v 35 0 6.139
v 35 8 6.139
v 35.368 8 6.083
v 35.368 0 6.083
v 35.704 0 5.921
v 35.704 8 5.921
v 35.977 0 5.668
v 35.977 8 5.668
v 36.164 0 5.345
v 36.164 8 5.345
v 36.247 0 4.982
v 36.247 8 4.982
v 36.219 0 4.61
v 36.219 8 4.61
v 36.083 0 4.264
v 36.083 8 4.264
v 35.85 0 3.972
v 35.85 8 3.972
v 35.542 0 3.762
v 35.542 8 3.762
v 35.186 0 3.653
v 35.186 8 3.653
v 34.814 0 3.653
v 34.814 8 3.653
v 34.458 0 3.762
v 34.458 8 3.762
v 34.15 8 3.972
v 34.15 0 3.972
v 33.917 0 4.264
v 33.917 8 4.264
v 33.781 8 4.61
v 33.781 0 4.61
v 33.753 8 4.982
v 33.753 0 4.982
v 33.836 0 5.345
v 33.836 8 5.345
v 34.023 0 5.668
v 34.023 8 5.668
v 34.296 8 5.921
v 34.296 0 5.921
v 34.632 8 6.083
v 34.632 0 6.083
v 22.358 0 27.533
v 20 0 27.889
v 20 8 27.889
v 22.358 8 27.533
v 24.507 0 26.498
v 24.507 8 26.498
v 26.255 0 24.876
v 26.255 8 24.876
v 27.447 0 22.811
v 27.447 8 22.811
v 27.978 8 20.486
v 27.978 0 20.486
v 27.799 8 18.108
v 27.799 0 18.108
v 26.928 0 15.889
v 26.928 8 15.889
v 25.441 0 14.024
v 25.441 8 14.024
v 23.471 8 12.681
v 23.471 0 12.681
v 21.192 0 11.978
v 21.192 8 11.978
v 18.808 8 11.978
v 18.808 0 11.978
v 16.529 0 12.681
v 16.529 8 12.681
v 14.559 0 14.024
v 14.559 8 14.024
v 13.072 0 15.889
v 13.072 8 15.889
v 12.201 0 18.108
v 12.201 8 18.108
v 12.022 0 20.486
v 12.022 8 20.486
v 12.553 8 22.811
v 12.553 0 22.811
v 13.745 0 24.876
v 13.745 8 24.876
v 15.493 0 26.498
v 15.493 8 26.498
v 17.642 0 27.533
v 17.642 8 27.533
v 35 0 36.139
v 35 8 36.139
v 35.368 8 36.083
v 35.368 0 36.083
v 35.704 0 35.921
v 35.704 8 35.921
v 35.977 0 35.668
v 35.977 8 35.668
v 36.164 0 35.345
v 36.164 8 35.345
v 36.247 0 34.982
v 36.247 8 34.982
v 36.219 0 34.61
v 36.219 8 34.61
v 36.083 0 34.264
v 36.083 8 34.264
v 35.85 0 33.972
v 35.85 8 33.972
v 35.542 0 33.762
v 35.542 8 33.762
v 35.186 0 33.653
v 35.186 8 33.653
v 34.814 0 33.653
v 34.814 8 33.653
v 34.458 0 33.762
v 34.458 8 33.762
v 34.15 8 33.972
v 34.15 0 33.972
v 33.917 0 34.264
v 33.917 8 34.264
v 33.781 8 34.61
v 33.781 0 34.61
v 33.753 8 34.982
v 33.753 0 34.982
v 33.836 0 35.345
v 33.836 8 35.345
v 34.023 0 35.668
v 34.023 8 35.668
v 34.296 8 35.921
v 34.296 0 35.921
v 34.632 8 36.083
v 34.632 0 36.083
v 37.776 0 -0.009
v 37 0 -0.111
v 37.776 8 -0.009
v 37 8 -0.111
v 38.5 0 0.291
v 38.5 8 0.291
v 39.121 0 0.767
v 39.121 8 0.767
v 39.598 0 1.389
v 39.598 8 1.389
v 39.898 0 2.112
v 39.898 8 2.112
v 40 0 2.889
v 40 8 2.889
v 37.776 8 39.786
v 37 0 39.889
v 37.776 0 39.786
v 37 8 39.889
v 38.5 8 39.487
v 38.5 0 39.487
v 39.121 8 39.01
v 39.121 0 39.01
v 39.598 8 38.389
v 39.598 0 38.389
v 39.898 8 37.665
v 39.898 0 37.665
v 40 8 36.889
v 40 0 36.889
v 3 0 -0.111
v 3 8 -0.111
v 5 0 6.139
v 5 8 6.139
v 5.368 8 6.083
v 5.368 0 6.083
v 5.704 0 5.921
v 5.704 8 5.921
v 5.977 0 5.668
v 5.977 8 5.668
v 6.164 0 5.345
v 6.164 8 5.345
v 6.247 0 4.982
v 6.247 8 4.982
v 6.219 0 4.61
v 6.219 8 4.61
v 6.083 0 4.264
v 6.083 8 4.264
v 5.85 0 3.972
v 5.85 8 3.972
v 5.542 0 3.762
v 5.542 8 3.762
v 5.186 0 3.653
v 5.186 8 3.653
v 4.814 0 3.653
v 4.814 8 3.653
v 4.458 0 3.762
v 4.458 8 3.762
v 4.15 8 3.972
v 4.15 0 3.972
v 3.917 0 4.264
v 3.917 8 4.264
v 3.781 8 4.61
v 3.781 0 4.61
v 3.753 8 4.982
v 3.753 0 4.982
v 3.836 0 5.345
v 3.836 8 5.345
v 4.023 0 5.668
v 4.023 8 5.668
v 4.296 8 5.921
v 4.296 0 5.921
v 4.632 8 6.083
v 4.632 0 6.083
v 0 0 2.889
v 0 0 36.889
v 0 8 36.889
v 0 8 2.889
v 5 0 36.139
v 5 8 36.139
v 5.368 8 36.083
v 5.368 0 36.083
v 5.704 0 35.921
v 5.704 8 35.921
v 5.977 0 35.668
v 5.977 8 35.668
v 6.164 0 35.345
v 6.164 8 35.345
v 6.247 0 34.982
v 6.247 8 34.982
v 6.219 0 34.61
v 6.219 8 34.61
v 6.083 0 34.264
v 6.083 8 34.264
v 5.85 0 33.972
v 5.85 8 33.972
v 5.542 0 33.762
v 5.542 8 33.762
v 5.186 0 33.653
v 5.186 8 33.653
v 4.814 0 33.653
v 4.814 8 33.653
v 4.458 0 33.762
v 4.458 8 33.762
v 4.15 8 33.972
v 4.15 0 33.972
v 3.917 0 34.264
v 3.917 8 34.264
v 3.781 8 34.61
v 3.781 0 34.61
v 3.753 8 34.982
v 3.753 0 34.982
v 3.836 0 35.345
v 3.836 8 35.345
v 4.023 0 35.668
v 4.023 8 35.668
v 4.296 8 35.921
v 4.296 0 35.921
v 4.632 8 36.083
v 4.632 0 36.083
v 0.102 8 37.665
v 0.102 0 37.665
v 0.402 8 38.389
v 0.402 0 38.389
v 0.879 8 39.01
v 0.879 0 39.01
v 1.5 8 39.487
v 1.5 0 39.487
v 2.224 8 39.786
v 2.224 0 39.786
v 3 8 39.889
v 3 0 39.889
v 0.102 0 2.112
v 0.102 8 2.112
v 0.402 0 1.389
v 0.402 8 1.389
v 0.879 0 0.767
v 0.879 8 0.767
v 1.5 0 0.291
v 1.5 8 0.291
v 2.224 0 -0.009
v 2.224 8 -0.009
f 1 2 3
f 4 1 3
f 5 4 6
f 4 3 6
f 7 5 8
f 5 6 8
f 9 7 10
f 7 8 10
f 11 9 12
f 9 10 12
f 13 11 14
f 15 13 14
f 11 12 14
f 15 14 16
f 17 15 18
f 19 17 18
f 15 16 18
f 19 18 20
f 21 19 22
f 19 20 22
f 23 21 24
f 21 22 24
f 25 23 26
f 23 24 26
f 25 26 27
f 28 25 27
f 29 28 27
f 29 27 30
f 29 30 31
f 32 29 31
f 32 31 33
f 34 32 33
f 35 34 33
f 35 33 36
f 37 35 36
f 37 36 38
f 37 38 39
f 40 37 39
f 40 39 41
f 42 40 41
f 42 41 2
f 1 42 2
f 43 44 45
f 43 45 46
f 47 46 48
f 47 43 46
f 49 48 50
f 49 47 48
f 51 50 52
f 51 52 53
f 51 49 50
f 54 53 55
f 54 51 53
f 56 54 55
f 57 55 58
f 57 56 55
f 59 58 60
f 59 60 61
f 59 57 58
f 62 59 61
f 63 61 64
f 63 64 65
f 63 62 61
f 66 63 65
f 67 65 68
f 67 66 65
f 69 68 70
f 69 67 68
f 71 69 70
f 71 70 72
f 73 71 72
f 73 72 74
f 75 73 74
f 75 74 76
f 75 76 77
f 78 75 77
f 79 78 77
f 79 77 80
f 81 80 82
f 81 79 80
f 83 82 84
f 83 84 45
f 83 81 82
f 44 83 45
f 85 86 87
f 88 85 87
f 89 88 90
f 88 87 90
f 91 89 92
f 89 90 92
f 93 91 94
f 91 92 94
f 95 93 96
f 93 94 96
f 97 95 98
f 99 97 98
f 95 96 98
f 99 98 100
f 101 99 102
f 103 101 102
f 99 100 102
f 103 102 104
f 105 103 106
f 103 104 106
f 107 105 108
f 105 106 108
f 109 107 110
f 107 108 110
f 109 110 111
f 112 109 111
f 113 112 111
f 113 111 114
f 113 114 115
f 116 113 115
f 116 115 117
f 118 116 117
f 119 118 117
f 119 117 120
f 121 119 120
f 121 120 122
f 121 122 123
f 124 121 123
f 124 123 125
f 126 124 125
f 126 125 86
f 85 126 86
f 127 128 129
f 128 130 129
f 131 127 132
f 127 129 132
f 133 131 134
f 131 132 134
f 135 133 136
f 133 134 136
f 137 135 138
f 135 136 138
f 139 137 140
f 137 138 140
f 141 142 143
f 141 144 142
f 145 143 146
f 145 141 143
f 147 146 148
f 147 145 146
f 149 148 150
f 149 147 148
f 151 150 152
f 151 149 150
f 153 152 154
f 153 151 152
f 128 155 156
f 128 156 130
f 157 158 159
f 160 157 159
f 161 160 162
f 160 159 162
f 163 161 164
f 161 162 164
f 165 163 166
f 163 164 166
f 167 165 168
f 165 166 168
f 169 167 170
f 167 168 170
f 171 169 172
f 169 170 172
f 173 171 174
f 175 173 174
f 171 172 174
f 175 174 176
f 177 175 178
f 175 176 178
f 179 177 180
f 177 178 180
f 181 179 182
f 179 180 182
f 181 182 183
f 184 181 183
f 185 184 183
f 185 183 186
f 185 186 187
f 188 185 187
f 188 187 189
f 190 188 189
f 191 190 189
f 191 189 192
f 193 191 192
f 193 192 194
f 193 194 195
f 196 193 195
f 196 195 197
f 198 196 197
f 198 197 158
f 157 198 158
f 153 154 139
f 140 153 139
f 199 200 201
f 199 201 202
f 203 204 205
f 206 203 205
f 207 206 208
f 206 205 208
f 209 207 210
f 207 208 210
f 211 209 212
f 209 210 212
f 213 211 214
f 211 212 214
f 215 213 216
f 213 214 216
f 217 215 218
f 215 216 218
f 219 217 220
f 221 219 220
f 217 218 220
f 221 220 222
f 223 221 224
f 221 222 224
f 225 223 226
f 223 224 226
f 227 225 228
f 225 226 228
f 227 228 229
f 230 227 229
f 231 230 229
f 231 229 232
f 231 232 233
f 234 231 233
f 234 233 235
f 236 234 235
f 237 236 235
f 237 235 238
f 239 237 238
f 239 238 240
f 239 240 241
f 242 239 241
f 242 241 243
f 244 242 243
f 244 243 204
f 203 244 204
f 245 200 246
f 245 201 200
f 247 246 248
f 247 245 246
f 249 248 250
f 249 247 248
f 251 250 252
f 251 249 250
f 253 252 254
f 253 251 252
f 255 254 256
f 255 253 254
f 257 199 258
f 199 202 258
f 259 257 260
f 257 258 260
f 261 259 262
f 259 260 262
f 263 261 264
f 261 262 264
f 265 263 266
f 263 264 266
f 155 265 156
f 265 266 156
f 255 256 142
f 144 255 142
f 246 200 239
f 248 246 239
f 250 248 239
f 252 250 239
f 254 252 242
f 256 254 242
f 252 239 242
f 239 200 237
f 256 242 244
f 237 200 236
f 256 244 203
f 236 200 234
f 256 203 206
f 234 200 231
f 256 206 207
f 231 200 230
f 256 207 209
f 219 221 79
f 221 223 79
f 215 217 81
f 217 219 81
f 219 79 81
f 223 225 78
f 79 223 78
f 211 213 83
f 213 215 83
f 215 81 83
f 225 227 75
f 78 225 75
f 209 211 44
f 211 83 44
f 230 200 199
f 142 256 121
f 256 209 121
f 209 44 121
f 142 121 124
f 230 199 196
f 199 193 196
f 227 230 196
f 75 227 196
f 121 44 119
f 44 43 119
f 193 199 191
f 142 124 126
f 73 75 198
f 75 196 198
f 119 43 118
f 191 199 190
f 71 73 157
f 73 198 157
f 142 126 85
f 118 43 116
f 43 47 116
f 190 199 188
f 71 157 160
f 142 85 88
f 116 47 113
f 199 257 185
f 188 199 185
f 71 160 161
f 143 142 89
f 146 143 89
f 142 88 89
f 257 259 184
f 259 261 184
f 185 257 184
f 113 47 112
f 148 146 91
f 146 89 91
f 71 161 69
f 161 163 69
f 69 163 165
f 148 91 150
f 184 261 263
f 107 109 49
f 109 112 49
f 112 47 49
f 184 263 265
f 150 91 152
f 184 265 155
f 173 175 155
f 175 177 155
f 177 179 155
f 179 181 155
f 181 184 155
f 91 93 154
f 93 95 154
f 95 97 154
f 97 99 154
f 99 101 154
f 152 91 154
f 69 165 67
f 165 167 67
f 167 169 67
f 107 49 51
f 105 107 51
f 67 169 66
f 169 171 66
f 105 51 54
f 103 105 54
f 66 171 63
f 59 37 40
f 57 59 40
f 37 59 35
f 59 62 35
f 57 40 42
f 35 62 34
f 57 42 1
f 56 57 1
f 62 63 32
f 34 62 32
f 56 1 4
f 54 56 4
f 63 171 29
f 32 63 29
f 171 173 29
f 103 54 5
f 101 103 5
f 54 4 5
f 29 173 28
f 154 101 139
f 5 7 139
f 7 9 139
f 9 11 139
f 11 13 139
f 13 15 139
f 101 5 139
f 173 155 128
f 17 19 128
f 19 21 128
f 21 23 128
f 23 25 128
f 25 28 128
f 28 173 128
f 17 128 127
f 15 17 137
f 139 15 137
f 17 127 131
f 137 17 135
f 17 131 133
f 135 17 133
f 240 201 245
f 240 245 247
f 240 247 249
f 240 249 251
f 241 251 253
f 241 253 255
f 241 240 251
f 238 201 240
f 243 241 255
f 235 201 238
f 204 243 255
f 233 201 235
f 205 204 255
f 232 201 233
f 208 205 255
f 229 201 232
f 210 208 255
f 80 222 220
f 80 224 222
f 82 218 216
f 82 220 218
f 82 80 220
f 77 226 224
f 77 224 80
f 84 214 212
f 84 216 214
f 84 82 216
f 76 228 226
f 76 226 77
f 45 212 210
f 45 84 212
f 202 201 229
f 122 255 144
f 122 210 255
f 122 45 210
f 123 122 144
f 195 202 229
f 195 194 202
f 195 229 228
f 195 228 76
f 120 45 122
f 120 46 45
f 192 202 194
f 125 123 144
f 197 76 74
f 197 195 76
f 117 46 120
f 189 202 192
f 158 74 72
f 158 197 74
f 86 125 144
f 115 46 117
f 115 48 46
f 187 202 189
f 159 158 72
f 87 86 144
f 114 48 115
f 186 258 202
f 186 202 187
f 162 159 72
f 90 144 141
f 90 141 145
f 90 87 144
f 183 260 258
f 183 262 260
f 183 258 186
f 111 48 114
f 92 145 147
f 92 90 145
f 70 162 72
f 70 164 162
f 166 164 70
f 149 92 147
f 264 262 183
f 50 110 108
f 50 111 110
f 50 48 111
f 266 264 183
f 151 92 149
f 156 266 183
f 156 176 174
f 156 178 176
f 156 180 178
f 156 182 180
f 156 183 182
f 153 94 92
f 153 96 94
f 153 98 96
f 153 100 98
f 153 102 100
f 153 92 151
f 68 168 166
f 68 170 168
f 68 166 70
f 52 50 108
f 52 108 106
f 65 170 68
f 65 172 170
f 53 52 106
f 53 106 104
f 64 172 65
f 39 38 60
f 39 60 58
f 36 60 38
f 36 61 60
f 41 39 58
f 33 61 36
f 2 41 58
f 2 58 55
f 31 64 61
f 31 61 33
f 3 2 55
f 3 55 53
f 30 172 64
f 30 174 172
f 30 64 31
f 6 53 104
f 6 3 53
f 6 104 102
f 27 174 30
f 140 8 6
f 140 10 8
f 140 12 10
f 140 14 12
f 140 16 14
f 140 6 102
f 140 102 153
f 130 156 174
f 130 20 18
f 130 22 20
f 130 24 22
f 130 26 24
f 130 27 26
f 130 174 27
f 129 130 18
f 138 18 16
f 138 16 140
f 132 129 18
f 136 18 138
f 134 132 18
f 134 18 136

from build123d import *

# Parameters (mm, degrees)
SKETCH1_W           = 40
SKETCH1_H           = 40
SKETCH1_R           = 8
BOSS_EXTRUDE1_DEPTH = 8
SKETCH12_R          = 1.25
CUT_EXTRUDE1_DEPTH  = 58.053472861
FILLET1_R           = 3


with BuildPart() as part:
    # Sketch1 → Boss-Extrude1 (new body)
    with BuildSketch(Plane(origin=(0, 0, 0), x_dir=(1, 0, 0), z_dir=(0, 1, 0))):
        with Locations((20, -19.888579387)):
            Rectangle(SKETCH1_W, SKETCH1_H)
        with Locations(Location((20, -19.888579387, 0), (0, 0, 270))):
            Circle(SKETCH1_R, mode=Mode.SUBTRACT)
    extrude(amount=BOSS_EXTRUDE1_DEPTH)

    # Sketch12 → Cut-Extrude1 (cut, through all)
    with BuildSketch(Plane(origin=(0, 8, 0), x_dir=(1, 0, 0), z_dir=(0, 1, 0))):
        with Locations(Location((5, -4.888579387, 0), (0, 0, 270))):
            Circle(SKETCH12_R)
        with Locations(Location((35, -4.888579387, 0), (0, 0, 270))):
            Circle(SKETCH12_R)
        with Locations(Location((35, -34.888579387, 0), (0, 0, 270))):
            Circle(SKETCH12_R)
        with Locations(Location((5, -34.888579387, 0), (0, 0, 270))):
            Circle(SKETCH12_R)
    extrude(amount=-CUT_EXTRUDE1_DEPTH, mode=Mode.SUBTRACT)

    # Fillet1
    fillet1_edges = [part.edges().sort_by_distance(p)[0] for p in [
        (0, 4, -0.111420613),
        (40, 4, -0.111420613),
        (40, 4, 39.888579387),
        (0, 4, 39.888579387),
    ]]
    fillet(fillet1_edges, radius=FILLET1_R)


solid = part.part
